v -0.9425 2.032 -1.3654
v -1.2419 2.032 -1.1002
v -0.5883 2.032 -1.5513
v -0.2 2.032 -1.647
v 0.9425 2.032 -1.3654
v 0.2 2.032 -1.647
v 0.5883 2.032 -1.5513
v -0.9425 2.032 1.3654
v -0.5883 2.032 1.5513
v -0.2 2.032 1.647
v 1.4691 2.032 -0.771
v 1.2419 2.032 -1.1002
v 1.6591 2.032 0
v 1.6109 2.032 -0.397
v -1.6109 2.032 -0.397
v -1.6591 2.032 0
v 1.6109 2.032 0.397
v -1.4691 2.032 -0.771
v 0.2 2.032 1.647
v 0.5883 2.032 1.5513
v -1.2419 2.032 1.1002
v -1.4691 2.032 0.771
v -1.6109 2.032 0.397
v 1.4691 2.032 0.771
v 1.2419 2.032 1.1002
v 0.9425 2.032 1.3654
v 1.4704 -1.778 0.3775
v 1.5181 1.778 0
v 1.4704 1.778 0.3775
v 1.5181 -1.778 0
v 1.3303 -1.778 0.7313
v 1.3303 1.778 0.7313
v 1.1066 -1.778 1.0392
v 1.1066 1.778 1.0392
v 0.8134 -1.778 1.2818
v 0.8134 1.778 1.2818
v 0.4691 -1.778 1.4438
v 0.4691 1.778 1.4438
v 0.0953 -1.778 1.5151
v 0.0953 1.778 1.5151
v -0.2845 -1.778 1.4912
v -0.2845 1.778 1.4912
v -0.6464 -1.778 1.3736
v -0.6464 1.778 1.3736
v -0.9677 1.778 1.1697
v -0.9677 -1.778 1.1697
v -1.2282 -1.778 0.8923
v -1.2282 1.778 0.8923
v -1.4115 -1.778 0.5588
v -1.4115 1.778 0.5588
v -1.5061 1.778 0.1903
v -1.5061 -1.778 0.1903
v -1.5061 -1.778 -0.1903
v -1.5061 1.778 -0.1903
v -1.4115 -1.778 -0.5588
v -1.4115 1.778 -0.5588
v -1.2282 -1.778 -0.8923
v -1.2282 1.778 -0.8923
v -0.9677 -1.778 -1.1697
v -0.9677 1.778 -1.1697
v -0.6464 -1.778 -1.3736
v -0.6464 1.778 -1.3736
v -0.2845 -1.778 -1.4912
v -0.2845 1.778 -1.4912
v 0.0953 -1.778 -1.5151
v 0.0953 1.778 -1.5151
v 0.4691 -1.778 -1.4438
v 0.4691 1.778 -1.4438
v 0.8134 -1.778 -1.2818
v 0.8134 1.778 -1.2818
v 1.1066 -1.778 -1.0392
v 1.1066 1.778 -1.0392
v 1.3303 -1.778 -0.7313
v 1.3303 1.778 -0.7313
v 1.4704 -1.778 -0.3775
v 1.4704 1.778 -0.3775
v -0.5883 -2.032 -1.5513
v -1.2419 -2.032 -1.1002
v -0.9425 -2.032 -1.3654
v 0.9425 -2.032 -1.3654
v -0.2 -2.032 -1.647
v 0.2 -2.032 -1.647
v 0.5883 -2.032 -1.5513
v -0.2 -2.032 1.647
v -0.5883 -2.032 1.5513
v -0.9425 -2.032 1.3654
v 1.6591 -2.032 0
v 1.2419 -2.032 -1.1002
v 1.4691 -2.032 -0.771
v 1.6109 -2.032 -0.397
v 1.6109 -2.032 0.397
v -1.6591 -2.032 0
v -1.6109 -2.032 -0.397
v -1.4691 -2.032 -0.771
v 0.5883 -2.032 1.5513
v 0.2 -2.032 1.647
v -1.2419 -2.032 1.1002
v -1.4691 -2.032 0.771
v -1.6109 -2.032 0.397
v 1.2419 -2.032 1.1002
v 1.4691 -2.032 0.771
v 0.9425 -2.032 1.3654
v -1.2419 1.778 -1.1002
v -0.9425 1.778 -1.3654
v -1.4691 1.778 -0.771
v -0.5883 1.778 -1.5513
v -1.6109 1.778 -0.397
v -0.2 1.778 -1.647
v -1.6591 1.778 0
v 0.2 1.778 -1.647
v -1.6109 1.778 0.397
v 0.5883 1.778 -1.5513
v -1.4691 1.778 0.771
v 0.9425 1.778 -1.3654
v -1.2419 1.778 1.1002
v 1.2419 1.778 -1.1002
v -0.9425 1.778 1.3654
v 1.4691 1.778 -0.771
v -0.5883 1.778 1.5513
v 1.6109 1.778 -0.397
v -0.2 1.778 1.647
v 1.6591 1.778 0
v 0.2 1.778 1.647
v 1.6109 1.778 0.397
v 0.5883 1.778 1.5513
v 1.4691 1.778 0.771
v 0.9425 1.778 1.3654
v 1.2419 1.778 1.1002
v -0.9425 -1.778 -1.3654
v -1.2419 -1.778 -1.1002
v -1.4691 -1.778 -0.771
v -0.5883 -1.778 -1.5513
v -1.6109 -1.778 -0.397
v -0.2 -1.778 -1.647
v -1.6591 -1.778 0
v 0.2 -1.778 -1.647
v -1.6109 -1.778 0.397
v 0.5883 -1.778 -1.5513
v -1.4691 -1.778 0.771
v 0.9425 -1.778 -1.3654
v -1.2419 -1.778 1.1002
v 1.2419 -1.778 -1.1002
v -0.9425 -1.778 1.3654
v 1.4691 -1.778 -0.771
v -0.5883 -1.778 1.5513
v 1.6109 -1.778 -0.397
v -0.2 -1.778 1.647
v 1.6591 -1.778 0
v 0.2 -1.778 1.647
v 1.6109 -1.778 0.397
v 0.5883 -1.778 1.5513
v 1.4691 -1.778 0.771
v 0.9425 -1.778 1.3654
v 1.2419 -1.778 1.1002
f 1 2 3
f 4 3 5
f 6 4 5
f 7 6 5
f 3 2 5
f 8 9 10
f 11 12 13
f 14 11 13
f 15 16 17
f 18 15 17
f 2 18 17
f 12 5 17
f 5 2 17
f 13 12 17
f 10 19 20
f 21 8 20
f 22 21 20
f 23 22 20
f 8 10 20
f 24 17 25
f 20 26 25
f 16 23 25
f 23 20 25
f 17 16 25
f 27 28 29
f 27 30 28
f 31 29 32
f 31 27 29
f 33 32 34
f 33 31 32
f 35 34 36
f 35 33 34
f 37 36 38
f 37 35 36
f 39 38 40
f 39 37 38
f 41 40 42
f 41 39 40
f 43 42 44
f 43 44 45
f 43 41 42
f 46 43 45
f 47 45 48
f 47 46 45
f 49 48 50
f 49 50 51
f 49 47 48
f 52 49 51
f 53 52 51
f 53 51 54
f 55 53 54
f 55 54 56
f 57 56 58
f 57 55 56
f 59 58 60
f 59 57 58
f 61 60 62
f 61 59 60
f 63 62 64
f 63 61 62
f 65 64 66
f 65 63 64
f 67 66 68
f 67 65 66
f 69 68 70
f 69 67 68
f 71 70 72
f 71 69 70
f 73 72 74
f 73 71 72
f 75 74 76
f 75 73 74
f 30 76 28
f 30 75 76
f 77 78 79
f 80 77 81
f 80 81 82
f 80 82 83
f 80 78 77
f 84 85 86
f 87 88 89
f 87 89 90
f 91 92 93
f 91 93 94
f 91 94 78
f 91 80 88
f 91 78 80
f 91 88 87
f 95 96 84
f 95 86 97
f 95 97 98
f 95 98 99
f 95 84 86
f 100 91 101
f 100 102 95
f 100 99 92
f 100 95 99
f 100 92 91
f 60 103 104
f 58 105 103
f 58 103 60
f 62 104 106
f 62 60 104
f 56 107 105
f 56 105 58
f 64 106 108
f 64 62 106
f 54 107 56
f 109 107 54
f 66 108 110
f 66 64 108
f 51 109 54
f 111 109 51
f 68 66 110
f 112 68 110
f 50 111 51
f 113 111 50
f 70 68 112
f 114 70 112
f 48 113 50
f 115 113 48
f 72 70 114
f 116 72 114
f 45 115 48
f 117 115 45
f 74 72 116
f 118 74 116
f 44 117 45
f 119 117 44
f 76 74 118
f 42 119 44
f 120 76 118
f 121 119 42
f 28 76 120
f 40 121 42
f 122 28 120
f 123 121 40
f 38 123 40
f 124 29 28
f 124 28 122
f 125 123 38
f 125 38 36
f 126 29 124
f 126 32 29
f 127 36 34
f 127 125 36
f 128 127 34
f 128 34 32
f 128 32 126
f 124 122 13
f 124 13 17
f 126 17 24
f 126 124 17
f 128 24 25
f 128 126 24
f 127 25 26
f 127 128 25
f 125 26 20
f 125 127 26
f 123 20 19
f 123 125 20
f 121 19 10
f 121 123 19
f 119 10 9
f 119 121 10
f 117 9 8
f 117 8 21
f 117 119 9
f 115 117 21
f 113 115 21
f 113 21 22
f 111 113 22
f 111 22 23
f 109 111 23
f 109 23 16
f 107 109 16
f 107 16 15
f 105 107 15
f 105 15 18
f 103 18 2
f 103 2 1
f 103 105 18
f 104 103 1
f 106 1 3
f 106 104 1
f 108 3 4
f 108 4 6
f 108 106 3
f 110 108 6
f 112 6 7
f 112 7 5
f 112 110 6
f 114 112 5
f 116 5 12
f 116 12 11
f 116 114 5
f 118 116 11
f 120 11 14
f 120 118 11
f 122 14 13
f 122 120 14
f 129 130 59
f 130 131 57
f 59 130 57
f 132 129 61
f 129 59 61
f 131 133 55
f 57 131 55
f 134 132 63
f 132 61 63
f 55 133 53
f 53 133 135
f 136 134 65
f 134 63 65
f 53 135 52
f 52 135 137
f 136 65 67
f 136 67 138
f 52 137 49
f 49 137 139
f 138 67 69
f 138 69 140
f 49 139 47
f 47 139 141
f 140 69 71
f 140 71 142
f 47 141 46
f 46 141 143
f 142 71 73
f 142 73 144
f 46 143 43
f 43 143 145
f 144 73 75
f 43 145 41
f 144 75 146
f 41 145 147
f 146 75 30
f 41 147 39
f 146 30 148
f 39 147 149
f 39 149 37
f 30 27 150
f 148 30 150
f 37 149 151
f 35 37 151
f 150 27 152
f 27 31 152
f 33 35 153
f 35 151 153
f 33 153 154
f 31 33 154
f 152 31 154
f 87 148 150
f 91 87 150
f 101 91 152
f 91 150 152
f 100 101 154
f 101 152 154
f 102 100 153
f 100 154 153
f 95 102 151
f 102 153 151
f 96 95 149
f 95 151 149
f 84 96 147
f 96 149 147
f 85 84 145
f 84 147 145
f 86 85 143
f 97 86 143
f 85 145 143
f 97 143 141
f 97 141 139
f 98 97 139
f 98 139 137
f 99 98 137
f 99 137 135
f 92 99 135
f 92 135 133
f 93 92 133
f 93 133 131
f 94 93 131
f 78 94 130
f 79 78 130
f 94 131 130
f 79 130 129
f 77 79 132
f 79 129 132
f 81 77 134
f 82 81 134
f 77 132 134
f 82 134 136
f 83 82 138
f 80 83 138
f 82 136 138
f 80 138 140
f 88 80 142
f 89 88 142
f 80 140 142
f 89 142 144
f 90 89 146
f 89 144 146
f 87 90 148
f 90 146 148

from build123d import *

# Parameters (mm, degrees)
F0_R          = 1.5180836213
F1_DEPTH      = 1.778
F1_DEPTH_BACK = 1.778
F2_R          = 1.6591021796
F3_DEPTH      = 0.254


# Not quite as in the source:
# - a pattern or mirror of a feature is missing from the dataset's text; its kind, count and spacing are read off the source's solid


with BuildPart() as f1:
    # F0 (on Front) → F1 (new body, two sides)
    with BuildSketch(Plane.XZ) as f1_sk:
        Circle(F0_R)
    extrude(amount=F1_DEPTH)
    extrude(f1_sk.sketch, amount=-F1_DEPTH_BACK)

    # F2 (on face) → F3 (join)
    with BuildSketch(Plane.XZ.offset(1.778)):
        Circle(F2_R)
    f3 = extrude(amount=F3_DEPTH)

    # F3_copies: F3 across plane
    add(f3.mirror(Plane.ZX))


solid = f1.part
